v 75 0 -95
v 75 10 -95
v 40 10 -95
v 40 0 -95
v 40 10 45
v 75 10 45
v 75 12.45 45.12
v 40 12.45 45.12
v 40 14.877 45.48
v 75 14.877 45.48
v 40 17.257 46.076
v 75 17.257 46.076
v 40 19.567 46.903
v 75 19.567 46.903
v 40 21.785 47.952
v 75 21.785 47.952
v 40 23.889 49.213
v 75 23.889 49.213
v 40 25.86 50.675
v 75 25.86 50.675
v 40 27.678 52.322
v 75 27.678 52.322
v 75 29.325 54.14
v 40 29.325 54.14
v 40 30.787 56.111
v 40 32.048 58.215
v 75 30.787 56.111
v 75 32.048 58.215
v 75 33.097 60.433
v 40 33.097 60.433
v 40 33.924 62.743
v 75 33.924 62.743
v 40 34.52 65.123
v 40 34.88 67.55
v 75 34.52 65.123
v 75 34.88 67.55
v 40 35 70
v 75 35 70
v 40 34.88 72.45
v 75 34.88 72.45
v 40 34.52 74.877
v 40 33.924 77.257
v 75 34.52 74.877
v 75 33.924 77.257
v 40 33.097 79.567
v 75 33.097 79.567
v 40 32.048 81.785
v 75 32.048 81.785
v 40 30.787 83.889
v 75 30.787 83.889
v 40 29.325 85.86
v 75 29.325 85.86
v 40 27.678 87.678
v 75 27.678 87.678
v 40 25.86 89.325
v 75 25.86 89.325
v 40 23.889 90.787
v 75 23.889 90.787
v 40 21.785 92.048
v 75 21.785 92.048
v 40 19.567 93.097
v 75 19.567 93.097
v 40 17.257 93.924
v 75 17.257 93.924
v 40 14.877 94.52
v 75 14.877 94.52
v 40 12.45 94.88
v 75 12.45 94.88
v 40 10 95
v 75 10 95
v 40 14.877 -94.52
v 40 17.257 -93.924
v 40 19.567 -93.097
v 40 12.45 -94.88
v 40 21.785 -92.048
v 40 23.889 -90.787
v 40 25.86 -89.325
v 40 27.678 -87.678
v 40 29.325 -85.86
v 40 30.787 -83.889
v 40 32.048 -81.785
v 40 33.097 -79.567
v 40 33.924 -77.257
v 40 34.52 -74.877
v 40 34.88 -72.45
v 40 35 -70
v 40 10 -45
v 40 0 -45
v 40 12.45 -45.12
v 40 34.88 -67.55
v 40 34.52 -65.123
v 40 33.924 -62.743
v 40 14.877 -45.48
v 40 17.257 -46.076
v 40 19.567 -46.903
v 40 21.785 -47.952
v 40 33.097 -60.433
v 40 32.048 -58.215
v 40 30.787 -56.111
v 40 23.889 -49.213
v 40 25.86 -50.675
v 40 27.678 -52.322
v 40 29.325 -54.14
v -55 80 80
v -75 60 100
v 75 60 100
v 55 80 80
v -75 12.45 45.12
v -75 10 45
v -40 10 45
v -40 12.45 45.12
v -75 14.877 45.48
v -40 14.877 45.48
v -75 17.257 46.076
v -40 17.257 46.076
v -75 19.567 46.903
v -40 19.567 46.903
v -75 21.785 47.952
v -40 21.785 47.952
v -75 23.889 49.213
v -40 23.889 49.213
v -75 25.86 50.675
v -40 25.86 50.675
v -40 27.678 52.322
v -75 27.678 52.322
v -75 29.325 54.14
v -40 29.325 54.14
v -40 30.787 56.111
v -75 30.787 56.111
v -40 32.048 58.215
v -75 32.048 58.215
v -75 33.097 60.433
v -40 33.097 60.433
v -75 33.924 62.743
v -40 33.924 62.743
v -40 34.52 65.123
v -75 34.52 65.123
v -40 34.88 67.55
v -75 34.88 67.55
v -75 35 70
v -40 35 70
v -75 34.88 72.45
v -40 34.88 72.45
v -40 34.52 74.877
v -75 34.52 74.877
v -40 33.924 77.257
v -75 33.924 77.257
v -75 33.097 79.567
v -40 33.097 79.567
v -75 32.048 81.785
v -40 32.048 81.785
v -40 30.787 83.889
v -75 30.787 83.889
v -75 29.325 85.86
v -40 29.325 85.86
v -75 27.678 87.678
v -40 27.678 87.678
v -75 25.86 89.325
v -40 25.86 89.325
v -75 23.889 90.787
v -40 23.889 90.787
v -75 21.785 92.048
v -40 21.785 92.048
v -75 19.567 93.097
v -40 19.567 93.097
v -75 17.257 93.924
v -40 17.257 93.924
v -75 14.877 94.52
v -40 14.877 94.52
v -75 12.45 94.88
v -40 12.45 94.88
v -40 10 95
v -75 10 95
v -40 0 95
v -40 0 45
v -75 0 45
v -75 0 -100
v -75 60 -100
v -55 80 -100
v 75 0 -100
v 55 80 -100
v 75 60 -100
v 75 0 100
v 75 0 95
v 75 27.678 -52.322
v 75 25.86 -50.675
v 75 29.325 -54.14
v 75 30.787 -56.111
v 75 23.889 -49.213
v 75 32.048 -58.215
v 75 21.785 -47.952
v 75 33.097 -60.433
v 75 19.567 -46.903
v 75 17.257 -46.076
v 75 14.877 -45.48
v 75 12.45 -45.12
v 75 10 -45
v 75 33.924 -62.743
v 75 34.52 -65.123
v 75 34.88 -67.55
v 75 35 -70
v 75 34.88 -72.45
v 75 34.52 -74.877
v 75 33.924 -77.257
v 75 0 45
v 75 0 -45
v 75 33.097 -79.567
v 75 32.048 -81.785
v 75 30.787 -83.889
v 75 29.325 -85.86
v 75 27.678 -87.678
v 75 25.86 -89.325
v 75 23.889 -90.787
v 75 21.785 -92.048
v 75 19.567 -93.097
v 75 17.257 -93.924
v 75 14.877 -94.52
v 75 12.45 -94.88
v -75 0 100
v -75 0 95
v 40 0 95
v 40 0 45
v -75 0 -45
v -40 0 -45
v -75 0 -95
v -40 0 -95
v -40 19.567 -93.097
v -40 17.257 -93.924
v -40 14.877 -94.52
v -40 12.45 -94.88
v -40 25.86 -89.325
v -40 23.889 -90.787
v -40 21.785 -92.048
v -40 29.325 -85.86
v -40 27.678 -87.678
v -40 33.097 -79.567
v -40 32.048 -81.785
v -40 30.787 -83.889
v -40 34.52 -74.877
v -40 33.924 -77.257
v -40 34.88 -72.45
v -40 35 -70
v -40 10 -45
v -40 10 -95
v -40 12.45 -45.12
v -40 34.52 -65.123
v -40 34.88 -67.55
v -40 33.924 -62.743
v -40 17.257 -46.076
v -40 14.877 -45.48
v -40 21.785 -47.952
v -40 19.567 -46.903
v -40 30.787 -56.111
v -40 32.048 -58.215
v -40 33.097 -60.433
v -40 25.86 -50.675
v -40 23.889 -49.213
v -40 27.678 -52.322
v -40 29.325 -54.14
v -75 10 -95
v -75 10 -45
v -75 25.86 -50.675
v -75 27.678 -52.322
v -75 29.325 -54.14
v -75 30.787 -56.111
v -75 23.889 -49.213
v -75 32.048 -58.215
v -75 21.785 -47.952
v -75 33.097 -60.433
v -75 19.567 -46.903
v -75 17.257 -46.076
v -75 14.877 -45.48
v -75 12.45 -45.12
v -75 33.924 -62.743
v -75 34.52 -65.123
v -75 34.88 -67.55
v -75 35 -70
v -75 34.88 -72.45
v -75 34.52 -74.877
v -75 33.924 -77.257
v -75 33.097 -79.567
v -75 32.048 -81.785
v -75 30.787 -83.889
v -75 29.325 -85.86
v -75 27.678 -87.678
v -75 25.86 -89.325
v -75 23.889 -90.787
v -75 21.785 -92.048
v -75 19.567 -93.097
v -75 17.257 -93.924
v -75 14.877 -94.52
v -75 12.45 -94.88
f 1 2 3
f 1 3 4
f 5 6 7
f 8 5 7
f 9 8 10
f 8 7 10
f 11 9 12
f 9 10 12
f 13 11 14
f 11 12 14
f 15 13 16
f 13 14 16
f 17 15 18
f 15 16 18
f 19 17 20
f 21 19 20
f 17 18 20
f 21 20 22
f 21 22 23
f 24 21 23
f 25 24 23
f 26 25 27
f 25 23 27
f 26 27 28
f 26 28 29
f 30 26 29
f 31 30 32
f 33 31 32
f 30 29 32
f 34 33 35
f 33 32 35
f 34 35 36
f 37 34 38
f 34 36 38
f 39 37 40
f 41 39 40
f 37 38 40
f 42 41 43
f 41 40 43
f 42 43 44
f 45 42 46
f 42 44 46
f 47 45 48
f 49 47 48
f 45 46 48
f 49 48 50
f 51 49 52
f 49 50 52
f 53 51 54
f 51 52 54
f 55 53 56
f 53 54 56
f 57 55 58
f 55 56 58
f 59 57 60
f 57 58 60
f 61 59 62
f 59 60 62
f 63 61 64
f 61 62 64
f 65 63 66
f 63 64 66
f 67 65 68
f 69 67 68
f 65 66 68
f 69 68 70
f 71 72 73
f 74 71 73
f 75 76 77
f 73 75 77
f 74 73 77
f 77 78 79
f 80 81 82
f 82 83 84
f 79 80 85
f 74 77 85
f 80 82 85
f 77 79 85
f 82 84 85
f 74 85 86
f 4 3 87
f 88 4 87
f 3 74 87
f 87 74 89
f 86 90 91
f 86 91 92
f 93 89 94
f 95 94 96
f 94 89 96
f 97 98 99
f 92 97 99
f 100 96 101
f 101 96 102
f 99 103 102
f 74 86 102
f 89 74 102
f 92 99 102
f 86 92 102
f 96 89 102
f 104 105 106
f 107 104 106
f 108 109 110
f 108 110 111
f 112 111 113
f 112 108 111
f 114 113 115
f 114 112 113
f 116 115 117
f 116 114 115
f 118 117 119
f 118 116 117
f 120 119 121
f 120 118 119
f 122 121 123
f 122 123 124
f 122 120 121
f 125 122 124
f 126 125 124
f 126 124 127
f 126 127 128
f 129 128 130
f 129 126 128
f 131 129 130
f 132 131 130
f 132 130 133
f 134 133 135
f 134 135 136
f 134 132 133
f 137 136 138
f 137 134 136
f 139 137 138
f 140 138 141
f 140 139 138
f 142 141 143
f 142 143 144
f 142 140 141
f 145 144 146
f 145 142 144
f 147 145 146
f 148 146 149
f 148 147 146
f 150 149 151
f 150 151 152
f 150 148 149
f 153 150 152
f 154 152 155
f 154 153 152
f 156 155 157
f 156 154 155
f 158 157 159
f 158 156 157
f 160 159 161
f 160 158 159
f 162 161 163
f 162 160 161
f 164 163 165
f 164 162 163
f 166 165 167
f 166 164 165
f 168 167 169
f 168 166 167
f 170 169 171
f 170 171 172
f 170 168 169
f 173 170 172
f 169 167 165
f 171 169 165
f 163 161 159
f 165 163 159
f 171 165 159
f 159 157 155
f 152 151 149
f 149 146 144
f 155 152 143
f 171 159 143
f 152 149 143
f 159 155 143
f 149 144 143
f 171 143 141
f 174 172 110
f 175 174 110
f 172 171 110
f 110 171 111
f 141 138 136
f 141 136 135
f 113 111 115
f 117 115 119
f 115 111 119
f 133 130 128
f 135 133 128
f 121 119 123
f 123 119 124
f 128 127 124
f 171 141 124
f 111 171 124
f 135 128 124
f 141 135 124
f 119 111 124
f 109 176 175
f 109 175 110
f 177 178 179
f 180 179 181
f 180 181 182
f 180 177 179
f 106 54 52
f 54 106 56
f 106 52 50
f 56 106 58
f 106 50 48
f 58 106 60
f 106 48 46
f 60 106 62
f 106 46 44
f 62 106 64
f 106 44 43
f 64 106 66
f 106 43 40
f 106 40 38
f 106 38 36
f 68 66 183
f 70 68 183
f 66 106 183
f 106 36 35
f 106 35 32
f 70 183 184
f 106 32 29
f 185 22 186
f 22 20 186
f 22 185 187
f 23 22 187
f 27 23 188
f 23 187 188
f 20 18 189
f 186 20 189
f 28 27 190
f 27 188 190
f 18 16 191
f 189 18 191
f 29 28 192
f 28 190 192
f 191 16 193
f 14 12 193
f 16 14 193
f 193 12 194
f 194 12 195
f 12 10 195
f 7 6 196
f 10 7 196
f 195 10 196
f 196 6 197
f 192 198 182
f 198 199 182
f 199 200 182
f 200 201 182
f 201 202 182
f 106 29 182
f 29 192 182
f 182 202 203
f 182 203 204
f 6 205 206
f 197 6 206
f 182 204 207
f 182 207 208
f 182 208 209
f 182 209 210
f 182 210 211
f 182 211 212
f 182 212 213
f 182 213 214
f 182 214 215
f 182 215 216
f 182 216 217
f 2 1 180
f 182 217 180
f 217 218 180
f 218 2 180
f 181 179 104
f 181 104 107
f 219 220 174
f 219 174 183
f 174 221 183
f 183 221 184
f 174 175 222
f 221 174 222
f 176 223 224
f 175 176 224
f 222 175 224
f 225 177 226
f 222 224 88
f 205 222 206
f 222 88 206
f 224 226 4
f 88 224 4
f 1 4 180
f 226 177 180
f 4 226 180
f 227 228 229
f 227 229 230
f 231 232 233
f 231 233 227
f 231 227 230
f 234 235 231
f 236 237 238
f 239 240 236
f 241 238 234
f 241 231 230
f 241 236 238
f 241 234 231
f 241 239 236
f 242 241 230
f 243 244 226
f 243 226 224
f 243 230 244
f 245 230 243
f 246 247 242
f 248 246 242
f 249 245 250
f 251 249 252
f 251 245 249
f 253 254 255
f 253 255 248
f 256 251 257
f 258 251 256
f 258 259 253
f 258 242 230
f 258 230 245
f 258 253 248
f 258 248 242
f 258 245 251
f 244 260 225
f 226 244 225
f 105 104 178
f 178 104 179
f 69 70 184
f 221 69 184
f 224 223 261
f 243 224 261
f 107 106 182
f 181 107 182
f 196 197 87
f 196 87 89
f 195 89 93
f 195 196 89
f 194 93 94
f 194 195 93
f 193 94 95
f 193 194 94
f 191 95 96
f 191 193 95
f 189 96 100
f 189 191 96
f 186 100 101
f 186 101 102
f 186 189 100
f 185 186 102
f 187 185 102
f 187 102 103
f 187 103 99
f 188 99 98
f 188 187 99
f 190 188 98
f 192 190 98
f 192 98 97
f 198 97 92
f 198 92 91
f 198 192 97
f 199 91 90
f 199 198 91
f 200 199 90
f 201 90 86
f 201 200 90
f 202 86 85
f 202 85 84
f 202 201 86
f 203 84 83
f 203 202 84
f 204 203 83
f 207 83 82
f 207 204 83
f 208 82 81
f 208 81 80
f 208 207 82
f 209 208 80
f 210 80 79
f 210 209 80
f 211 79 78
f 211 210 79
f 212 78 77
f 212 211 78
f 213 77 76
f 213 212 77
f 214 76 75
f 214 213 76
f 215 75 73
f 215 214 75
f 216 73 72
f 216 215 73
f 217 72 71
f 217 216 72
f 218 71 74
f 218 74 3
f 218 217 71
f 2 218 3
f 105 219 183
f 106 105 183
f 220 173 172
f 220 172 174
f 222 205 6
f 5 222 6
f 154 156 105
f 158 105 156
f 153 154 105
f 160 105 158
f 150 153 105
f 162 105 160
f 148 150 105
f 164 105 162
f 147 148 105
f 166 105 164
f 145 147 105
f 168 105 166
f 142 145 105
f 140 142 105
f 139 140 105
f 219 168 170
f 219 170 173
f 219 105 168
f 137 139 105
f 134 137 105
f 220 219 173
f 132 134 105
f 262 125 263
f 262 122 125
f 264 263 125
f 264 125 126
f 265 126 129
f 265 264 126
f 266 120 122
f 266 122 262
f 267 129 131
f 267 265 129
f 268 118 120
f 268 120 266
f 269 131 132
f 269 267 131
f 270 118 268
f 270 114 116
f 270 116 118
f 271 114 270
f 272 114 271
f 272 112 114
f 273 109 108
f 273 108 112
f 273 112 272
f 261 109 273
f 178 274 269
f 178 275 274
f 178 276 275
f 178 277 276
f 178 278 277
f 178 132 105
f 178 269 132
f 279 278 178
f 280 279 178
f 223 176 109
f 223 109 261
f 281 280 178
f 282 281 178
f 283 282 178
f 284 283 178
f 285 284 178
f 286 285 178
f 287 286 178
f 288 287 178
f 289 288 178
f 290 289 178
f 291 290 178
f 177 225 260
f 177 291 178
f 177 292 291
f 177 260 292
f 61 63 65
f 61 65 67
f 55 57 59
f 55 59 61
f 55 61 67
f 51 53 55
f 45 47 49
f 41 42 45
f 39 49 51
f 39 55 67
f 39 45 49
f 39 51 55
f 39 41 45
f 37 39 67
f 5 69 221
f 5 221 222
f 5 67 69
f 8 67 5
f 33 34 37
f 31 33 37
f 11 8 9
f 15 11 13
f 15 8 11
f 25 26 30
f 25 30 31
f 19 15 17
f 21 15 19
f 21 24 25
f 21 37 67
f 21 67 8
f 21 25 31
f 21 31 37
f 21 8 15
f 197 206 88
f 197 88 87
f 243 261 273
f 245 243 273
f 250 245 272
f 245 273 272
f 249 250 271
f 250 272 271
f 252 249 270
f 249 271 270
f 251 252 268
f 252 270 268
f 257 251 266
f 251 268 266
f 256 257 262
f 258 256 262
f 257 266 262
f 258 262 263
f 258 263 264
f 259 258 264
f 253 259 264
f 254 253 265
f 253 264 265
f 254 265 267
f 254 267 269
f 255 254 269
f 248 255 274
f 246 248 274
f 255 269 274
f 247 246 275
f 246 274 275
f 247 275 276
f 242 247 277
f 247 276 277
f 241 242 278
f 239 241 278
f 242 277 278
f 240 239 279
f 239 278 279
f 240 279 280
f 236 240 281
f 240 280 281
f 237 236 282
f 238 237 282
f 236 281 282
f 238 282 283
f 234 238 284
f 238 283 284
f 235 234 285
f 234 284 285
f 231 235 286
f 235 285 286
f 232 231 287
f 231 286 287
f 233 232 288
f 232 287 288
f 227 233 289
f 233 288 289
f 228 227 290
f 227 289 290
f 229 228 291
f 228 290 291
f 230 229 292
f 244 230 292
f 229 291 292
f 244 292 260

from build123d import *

# Parameters (mm, degrees)
SKETCH1_W            = 150
SKETCH1_H            = 200
BOSS_EXTRUDE1_DEPTH  = 80
CUT_EXTRUDE3_DEPTH   = 35
MIRROR2_COPY_1_DEPTH = 35
CHAMFER1_SIZE        = 20


with BuildPart() as part:
    # Sketch1 → Boss-Extrude1 (new body)
    with BuildSketch(Plane(origin=(0, 0, 0), x_dir=(1, 0, 0), z_dir=(0, 1, 0))):
        Rectangle(SKETCH1_W, SKETCH1_H)
    extrude(amount=BOSS_EXTRUDE1_DEPTH)

    # Sketch4 → Cut-Extrude3 (cut)
    with BuildSketch(Plane.ZY.offset(75)):
        with BuildLine():
            Line((-92.912878475, 0), (-95, 0))
            Line((-95, 0), (-95, -15))
            Line((-95, -15), (-70, -15))
            ThreePointArc((-70, -15), (-83.693063938, -10.916500663), (-92.912878475, 0))
        make_face()
        with BuildLine():
            ThreePointArc((-92.912878475, 0), (-94.472657823, 4.892258908), (-95, 10))
            Line((-95, 10), (-95, 0))
            Line((-95, 0), (-92.912878475, 0))
        make_face()
        with BuildLine():
            Line((-45, 10), (-95, 10))
            ThreePointArc((-95, 10), (-94.472657823, 4.892258908), (-92.912878475, 0))
            Line((-92.912878475, 0), (-47.087121525, 0))
            ThreePointArc((-47.087121525, 0), (-45.527342177, 4.892258908), (-45, 10))
        make_face()
        with BuildLine():
            ThreePointArc((-45, 10), (-70, 35), (-95, 10))
            Line((-95, 10), (-45, 10))
        make_face()
        with BuildLine():
            Line((-45, 0), (-45, 10))
            ThreePointArc((-45, 10), (-45.527342177, 4.892258908), (-47.087121525, 0))
            Line((-47.087121525, 0), (-45, 0))
        make_face()
        with BuildLine():
            Line((-45, -15), (-45, 0))
            Line((-45, 0), (-47.087121525, 0))
            ThreePointArc((-47.087121525, 0), (-56.306936062, -10.916500663), (-70, -15))
            Line((-70, -15), (-45, -15))
        make_face()
        with BuildLine():
            Line((-47.087121525, 0), (-92.912878475, 0))
            ThreePointArc((-92.912878475, 0), (-83.693063938, -10.916500663), (-70, -15))
            ThreePointArc((-70, -15), (-56.306936062, -10.916500663), (-47.087121525, 0))
        make_face()
    cut_extrude3 = extrude(amount=-CUT_EXTRUDE3_DEPTH, mode=Mode.SUBTRACT)

    # Mirror1: Cut-Extrude3 across plane
    add(cut_extrude3.mirror(Plane.XY), mode=Mode.SUBTRACT)

    # Mirror2: Cut-Extrude3 across plane
    add(cut_extrude3.mirror(Plane.ZY), mode=Mode.SUBTRACT)

    # Mirror2 copy 1 sketch → Mirror2 copy 1 (cut)
    with BuildSketch(Plane(origin=(75, 0, 0), x_dir=(0, 0, -1), z_dir=(1, 0, 0))):
        with BuildLine():
            Line((-92.912878475, 0), (-95, 0))
            Line((-95, 0), (-95, -15))
            Line((-95, -15), (-70, -15))
            ThreePointArc((-70, -15), (-83.693063938, -10.916500663), (-92.912878475, 0))
        make_face()
        with BuildLine():
            ThreePointArc((-92.912878475, 0), (-94.472657823, 4.892258908), (-95, 10))
            Line((-95, 10), (-95, 0))
            Line((-95, 0), (-92.912878475, 0))
        make_face()
        with BuildLine():
            Line((-45, 10), (-95, 10))
            ThreePointArc((-95, 10), (-94.472657823, 4.892258908), (-92.912878475, 0))
            Line((-92.912878475, 0), (-47.087121525, 0))
            ThreePointArc((-47.087121525, 0), (-45.527342177, 4.892258908), (-45, 10))
        make_face()
        with BuildLine():
            ThreePointArc((-45, 10), (-70, 35), (-95, 10))
            Line((-95, 10), (-45, 10))
        make_face()
        with BuildLine():
            Line((-45, 0), (-45, 10))
            ThreePointArc((-45, 10), (-45.527342177, 4.892258908), (-47.087121525, 0))
            Line((-47.087121525, 0), (-45, 0))
        make_face()
        with BuildLine():
            Line((-45, -15), (-45, 0))
            Line((-45, 0), (-47.087121525, 0))
            ThreePointArc((-47.087121525, 0), (-56.306936062, -10.916500663), (-70, -15))
            Line((-70, -15), (-45, -15))
        make_face()
        with BuildLine():
            Line((-47.087121525, 0), (-92.912878475, 0))
            ThreePointArc((-92.912878475, 0), (-83.693063938, -10.916500663), (-70, -15))
            ThreePointArc((-70, -15), (-56.306936062, -10.916500663), (-47.087121525, 0))
        make_face()
    extrude(amount=-MIRROR2_COPY_1_DEPTH, mode=Mode.SUBTRACT)

    # Chamfer1
    chamfer1_edges = [part.edges().sort_by_distance(p)[0] for p in [
        (-75, 80, 0),
        (0, 80, 100),
        (75, 80, 0),
    ]]
    chamfer(chamfer1_edges, length=CHAMFER1_SIZE)


solid = part.part
